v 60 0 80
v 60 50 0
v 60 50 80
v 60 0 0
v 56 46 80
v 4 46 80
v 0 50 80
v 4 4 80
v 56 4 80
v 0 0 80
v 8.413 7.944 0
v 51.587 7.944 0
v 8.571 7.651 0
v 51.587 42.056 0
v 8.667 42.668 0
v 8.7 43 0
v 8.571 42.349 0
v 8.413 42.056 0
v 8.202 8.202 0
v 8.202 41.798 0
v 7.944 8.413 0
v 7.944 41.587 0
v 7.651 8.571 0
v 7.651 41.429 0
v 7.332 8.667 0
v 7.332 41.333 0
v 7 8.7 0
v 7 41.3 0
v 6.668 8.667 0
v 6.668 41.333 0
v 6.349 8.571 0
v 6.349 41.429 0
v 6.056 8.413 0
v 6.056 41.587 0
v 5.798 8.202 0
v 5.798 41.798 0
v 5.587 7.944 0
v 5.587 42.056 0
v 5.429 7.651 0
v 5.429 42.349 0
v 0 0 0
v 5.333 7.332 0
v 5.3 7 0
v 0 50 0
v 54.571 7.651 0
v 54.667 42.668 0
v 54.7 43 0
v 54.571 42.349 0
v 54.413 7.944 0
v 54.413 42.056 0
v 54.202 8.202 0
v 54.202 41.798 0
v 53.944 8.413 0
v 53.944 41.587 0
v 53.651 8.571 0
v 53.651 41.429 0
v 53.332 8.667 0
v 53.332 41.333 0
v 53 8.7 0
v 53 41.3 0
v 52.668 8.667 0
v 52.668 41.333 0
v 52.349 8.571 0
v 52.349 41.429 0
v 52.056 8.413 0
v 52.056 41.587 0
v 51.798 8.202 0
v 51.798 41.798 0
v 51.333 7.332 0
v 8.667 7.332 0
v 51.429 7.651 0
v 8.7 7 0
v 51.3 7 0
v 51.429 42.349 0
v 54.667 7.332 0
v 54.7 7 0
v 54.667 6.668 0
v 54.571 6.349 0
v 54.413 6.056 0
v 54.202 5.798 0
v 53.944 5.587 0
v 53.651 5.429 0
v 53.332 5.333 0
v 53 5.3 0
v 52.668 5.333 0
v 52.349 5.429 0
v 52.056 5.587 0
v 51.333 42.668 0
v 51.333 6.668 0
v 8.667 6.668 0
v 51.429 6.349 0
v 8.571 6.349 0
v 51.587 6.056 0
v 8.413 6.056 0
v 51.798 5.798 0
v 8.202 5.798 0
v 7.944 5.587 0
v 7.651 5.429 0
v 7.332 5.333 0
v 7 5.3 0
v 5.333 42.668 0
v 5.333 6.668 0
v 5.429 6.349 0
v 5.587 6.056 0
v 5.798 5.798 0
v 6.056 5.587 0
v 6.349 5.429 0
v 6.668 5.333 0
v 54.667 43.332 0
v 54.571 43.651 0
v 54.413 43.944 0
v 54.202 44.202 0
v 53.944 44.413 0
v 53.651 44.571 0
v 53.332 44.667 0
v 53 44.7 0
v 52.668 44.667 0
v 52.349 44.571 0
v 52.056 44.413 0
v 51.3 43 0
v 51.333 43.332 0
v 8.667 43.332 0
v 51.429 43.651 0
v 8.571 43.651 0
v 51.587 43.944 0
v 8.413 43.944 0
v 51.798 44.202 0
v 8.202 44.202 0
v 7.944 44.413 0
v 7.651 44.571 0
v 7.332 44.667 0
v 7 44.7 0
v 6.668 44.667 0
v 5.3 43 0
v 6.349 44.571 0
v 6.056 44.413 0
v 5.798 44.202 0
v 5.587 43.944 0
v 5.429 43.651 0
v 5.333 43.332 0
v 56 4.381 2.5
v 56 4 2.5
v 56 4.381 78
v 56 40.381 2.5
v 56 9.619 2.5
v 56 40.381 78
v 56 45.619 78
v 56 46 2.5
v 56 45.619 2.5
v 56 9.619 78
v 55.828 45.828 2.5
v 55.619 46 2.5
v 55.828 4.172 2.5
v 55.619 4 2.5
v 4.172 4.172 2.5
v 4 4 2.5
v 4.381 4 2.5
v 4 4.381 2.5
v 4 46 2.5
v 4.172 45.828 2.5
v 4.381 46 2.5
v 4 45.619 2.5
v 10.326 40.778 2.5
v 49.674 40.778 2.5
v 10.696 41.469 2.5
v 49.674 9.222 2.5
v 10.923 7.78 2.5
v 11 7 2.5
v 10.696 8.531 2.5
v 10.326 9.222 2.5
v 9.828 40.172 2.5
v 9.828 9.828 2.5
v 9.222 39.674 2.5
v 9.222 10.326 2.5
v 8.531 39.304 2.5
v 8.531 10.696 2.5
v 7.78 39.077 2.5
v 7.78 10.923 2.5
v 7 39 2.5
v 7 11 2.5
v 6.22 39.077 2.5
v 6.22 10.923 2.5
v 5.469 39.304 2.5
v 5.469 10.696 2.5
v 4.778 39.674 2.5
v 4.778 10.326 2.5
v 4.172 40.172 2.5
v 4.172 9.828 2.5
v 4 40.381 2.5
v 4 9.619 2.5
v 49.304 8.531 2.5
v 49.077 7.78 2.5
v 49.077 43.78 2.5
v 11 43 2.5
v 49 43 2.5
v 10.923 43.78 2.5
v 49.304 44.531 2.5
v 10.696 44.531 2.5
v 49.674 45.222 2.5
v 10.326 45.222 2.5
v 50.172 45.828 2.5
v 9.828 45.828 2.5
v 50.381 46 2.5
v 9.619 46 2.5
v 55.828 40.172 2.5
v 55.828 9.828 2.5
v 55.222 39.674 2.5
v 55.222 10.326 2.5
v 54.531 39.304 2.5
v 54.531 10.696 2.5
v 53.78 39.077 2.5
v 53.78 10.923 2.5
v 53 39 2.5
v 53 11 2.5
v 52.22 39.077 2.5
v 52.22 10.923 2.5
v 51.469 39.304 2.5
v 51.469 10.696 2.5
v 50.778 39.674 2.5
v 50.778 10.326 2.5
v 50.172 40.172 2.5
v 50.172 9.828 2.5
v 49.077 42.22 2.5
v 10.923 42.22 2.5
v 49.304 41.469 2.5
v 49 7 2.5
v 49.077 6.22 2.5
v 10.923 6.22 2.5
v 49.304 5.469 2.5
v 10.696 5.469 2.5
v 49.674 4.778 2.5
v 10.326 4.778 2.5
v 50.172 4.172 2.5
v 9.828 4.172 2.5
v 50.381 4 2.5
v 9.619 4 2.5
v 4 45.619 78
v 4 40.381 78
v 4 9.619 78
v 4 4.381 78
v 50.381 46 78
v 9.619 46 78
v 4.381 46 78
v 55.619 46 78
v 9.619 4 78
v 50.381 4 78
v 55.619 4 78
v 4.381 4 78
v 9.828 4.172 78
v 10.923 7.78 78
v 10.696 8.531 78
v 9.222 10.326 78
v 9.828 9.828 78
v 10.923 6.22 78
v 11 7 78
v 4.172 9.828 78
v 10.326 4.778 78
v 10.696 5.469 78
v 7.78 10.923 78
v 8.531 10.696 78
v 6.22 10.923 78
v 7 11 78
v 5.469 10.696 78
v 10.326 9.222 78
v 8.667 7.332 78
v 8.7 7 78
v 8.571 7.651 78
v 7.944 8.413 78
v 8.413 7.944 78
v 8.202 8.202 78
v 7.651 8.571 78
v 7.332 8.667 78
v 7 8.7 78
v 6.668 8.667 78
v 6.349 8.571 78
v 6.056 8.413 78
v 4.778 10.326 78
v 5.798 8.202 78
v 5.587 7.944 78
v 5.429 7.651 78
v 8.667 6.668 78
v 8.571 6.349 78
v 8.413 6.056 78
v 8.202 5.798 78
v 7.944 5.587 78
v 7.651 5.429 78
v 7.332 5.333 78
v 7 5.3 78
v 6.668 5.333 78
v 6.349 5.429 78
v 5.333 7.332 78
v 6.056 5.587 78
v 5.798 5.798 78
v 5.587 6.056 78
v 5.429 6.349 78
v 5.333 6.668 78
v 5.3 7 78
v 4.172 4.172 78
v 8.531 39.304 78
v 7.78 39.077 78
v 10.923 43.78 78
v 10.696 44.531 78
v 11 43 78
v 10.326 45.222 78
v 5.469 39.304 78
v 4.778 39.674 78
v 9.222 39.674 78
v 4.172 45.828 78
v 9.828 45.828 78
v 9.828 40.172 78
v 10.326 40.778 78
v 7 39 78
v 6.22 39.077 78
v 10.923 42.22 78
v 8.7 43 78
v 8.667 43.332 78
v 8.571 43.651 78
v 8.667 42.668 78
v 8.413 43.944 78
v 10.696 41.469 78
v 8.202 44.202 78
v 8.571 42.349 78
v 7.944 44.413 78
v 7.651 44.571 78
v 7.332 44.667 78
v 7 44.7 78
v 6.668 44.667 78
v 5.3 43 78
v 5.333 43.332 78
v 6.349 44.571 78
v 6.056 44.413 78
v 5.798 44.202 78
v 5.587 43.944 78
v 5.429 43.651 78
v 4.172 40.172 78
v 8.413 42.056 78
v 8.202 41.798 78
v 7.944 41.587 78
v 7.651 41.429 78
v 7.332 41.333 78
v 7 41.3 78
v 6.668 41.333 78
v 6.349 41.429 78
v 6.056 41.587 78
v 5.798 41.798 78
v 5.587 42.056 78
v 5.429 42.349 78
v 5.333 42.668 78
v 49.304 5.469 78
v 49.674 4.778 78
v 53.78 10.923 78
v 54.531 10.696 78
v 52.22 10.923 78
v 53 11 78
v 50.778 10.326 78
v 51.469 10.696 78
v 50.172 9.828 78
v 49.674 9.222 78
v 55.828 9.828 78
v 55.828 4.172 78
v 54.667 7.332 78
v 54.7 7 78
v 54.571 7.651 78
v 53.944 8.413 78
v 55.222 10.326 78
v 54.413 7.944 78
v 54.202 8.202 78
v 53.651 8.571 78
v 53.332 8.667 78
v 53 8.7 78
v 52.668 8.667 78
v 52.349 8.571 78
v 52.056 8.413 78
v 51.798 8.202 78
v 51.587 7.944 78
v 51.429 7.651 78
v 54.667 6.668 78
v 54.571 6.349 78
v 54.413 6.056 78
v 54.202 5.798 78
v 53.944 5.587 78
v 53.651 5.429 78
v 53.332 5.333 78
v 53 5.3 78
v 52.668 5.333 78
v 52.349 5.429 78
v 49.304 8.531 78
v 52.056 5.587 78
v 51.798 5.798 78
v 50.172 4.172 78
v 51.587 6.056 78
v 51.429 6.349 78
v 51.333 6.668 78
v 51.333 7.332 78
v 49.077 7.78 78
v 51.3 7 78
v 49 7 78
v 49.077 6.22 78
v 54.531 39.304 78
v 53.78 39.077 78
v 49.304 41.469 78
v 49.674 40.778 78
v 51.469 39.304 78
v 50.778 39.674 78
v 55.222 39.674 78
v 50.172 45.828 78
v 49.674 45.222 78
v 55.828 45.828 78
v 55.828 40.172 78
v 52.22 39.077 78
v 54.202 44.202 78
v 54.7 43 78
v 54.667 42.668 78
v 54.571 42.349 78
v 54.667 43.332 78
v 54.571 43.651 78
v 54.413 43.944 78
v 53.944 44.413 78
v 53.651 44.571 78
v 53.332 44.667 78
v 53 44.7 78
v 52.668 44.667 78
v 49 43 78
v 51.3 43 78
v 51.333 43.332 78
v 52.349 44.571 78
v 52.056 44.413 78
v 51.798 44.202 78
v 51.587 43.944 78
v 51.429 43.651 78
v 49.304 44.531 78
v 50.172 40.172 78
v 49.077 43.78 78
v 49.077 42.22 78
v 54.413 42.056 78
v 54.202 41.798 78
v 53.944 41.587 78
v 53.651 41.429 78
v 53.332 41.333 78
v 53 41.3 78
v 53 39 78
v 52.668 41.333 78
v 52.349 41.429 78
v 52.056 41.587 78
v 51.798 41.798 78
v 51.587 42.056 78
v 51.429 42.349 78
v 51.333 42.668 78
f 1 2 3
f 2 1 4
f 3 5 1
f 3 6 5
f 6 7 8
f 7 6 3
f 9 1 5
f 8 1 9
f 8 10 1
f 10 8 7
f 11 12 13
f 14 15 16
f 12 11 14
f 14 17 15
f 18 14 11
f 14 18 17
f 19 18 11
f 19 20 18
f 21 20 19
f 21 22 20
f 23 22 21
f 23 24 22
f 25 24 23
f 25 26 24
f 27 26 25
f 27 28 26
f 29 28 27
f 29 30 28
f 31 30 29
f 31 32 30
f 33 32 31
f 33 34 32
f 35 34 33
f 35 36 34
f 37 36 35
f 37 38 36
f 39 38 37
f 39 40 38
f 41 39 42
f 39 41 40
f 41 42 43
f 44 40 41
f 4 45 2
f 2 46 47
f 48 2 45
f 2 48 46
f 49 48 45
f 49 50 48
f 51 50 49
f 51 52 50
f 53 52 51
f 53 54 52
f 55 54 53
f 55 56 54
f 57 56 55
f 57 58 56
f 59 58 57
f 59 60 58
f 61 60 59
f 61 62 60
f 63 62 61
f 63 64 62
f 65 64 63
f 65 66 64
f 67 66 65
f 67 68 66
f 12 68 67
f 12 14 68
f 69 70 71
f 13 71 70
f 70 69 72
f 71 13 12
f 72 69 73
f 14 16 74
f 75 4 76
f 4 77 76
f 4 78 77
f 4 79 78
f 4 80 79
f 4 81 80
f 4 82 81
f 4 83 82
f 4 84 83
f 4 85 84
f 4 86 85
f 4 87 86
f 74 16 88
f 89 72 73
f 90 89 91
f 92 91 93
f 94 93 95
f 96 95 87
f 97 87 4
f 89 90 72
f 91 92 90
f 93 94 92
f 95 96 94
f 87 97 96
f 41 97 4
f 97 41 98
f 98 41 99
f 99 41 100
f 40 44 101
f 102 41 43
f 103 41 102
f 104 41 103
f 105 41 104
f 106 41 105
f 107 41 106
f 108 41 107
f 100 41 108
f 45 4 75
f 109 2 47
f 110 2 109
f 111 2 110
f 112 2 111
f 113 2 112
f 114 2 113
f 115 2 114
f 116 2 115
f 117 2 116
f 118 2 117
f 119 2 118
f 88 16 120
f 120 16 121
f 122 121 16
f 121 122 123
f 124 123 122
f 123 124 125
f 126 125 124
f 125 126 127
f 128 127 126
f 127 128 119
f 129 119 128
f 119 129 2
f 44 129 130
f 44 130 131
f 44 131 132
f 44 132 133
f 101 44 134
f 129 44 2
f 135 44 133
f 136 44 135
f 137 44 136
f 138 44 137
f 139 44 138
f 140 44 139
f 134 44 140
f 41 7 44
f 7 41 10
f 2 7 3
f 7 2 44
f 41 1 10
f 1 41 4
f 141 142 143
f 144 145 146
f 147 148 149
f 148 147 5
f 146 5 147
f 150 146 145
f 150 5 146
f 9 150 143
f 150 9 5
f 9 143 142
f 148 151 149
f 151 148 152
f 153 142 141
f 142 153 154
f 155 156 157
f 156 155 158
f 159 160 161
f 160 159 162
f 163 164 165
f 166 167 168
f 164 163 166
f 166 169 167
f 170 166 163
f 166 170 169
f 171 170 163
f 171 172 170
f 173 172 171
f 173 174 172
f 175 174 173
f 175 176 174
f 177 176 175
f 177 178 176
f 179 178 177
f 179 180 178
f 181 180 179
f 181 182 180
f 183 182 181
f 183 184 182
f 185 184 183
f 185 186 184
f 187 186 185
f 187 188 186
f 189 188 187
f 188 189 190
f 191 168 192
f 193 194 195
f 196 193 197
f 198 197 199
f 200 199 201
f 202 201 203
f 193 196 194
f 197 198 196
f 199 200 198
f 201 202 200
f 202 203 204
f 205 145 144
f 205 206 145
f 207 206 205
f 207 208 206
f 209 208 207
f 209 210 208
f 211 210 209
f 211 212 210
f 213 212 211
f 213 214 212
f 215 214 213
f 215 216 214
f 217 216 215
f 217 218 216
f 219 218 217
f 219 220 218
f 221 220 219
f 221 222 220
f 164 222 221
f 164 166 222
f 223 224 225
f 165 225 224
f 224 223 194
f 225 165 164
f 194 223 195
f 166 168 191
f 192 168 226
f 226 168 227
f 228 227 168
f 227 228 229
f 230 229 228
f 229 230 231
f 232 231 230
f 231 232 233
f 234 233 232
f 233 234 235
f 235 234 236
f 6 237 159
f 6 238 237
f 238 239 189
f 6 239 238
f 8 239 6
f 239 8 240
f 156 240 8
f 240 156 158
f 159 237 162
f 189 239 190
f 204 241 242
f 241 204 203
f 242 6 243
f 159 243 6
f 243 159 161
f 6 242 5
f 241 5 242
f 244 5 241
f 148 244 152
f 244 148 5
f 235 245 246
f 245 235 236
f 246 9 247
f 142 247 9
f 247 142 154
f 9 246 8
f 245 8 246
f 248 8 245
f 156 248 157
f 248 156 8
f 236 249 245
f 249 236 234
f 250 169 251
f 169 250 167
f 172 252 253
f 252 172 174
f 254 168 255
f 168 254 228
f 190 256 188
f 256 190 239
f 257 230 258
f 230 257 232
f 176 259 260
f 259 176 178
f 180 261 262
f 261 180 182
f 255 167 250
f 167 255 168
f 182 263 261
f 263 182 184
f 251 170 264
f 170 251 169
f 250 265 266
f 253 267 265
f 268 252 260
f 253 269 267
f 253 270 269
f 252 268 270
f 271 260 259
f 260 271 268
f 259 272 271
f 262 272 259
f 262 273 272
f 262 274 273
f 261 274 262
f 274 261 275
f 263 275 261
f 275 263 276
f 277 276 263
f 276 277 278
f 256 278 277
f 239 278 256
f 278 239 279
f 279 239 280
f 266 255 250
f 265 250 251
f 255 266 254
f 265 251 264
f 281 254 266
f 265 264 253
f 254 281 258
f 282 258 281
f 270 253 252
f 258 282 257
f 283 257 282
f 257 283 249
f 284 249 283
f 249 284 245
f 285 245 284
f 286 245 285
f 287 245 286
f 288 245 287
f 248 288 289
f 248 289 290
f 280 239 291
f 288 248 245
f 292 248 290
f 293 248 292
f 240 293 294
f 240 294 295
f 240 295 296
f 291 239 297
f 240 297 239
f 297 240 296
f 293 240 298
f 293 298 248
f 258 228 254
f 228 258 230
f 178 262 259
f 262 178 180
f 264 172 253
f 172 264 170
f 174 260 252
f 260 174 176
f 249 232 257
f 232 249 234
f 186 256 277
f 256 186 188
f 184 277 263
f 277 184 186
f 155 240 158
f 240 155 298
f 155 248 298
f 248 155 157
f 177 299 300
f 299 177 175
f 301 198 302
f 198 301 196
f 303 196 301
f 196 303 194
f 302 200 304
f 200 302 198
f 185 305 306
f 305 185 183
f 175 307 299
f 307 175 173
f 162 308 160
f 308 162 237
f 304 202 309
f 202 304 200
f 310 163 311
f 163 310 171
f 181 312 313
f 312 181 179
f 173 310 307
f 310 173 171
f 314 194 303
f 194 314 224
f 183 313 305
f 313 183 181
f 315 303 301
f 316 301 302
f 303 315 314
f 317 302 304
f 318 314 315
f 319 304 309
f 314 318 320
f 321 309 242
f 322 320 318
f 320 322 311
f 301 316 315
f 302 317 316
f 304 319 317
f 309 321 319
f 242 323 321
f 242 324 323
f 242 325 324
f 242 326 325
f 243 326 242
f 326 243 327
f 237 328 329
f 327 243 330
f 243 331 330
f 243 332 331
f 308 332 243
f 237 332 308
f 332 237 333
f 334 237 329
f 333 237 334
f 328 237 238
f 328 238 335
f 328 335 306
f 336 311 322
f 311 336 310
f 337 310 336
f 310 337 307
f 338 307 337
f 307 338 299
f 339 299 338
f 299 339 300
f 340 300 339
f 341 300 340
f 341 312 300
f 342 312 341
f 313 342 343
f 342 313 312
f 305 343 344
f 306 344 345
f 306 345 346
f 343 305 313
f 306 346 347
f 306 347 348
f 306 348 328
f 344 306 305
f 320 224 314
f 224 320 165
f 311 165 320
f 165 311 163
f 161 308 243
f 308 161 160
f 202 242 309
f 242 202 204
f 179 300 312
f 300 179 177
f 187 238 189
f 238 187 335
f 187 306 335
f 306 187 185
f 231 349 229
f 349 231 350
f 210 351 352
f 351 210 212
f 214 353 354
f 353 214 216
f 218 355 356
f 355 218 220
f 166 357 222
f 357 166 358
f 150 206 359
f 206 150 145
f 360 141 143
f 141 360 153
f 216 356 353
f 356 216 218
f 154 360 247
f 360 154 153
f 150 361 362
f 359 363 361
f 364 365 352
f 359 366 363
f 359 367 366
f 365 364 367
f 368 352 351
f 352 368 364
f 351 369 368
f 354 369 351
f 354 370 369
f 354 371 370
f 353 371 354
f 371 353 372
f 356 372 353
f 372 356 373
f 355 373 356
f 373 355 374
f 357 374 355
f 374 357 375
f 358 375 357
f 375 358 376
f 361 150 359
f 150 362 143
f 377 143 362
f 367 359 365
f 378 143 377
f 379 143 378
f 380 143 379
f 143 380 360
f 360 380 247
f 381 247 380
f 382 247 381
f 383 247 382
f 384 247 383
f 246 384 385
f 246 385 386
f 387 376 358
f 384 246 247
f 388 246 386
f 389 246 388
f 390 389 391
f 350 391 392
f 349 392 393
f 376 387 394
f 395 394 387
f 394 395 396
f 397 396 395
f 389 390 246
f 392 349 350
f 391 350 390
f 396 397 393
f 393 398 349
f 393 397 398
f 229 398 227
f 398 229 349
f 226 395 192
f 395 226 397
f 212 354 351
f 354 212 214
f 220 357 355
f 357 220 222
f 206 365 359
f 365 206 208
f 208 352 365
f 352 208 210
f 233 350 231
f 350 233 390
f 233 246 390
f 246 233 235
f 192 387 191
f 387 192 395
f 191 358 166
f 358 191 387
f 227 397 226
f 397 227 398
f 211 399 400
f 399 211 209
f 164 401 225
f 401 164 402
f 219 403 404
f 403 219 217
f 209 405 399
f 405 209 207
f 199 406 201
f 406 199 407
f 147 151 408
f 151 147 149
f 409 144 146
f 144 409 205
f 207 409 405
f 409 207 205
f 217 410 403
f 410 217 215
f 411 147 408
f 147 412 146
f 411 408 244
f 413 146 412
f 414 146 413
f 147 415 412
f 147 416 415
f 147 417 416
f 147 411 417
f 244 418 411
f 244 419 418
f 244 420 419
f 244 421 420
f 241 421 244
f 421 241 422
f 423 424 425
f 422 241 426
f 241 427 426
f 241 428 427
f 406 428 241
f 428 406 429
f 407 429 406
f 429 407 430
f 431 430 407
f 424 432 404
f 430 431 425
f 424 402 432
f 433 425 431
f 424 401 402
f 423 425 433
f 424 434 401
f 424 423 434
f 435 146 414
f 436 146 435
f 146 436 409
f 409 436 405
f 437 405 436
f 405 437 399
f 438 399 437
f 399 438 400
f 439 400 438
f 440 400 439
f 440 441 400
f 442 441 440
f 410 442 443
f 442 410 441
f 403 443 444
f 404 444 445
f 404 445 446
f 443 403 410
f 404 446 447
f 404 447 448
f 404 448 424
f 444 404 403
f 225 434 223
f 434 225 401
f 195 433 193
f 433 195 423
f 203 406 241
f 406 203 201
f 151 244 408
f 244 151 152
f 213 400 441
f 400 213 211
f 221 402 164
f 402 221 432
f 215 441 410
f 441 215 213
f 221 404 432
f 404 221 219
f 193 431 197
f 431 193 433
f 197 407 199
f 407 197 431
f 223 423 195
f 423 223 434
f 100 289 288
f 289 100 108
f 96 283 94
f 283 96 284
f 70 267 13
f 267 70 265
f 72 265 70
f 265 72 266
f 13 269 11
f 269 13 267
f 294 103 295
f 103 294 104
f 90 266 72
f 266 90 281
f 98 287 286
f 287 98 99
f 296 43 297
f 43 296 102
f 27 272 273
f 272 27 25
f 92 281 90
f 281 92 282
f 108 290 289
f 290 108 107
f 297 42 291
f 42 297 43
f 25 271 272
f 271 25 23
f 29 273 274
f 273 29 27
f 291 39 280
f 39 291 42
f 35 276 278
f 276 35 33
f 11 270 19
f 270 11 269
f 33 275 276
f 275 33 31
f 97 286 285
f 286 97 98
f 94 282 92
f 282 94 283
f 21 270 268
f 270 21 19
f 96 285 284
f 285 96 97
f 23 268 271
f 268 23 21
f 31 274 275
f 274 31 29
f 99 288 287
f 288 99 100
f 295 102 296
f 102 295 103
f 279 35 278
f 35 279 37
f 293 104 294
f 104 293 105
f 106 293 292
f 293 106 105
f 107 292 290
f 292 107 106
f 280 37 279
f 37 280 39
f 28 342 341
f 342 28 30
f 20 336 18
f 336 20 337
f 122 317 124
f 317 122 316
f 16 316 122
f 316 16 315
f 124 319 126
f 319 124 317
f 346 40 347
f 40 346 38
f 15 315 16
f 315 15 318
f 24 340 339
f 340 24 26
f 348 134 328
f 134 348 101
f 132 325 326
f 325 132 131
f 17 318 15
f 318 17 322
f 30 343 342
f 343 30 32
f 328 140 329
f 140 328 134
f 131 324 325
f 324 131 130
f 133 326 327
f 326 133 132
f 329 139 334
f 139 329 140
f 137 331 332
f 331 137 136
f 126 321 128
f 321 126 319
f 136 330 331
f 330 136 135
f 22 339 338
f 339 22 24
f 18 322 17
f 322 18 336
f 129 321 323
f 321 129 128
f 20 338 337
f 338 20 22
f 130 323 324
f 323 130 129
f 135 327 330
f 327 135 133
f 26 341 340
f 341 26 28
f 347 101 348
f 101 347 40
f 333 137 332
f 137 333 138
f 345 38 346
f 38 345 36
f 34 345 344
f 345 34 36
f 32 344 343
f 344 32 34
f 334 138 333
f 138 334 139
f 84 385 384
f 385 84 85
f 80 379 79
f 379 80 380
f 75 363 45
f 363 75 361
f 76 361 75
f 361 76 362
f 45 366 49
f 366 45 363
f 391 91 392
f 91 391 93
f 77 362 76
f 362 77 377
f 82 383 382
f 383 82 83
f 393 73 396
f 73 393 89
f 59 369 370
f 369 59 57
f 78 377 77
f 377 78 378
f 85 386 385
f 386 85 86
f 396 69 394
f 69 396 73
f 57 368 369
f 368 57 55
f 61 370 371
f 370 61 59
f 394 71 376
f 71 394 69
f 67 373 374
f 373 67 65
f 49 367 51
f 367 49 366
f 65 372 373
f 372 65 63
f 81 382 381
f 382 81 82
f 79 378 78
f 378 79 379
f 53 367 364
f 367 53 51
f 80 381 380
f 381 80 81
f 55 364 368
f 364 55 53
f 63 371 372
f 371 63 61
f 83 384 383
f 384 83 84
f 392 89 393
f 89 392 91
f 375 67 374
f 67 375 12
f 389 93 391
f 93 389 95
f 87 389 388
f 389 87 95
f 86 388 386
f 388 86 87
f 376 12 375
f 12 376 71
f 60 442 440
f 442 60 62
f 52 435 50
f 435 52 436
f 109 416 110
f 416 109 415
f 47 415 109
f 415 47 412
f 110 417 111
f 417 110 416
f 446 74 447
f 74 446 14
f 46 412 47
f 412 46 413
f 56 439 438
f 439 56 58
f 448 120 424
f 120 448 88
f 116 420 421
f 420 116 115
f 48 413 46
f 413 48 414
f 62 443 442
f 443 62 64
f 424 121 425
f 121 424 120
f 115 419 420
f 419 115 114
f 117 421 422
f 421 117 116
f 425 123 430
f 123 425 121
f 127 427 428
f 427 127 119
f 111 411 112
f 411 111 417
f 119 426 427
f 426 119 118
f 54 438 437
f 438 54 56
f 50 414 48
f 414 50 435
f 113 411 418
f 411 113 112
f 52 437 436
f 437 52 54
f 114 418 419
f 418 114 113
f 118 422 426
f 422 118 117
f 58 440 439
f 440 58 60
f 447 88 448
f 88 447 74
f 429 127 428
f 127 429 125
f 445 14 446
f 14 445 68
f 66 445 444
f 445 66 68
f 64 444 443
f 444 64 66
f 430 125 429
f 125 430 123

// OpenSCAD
$fn = 32;

// ----------------------------------------------------------------------
// Enclosure body: 60 x 50 x 80 mm, wall 4 mm
// ----------------------------------------------------------------------

// --- parameters (mm) ---
length = 60;              // outside length, X
width = 50;               // outside width, Y
height = 80;              // outside height, Z
wall = 4;                 // side wall thickness
floor_t = 2.5;            // floor thickness
boss_d = 8;               // corner boss diameter
boss_h = 75.5;            // corner boss height above the floor
boss_hole_d = 3.4;        // lid screw clearance in the boss
boss_lip = 7;             // boss centre inset from the corner

module shell() {
  difference() {
    cube([length, width, height]);
    /* hollow, open at the top */
    translate([wall, wall, floor_t])
      cube([length - 2 * wall, width - 2 * wall, height]);
  }
}

module bosses() {
  /* corner bosses, sunk 1 mm into the floor */
  for (sx = [0, 1]) for (sy = [0, 1])
    translate([sx * (length - 2 * boss_lip) + boss_lip, sy * (width - 2 * boss_lip) + boss_lip, floor_t - 1])
      cylinder(h = boss_h + 1, d = boss_d);
}

difference() {
  union() {
    shell();
    bosses();
  }
  /* boss screw holes */
  for (sx = [0, 1]) for (sy = [0, 1])
    translate([sx * (length - 2 * boss_lip) + boss_lip, sy * (width - 2 * boss_lip) + boss_lip, -1]) cylinder(h = floor_t + boss_h + 2, d = boss_hole_d);
}
